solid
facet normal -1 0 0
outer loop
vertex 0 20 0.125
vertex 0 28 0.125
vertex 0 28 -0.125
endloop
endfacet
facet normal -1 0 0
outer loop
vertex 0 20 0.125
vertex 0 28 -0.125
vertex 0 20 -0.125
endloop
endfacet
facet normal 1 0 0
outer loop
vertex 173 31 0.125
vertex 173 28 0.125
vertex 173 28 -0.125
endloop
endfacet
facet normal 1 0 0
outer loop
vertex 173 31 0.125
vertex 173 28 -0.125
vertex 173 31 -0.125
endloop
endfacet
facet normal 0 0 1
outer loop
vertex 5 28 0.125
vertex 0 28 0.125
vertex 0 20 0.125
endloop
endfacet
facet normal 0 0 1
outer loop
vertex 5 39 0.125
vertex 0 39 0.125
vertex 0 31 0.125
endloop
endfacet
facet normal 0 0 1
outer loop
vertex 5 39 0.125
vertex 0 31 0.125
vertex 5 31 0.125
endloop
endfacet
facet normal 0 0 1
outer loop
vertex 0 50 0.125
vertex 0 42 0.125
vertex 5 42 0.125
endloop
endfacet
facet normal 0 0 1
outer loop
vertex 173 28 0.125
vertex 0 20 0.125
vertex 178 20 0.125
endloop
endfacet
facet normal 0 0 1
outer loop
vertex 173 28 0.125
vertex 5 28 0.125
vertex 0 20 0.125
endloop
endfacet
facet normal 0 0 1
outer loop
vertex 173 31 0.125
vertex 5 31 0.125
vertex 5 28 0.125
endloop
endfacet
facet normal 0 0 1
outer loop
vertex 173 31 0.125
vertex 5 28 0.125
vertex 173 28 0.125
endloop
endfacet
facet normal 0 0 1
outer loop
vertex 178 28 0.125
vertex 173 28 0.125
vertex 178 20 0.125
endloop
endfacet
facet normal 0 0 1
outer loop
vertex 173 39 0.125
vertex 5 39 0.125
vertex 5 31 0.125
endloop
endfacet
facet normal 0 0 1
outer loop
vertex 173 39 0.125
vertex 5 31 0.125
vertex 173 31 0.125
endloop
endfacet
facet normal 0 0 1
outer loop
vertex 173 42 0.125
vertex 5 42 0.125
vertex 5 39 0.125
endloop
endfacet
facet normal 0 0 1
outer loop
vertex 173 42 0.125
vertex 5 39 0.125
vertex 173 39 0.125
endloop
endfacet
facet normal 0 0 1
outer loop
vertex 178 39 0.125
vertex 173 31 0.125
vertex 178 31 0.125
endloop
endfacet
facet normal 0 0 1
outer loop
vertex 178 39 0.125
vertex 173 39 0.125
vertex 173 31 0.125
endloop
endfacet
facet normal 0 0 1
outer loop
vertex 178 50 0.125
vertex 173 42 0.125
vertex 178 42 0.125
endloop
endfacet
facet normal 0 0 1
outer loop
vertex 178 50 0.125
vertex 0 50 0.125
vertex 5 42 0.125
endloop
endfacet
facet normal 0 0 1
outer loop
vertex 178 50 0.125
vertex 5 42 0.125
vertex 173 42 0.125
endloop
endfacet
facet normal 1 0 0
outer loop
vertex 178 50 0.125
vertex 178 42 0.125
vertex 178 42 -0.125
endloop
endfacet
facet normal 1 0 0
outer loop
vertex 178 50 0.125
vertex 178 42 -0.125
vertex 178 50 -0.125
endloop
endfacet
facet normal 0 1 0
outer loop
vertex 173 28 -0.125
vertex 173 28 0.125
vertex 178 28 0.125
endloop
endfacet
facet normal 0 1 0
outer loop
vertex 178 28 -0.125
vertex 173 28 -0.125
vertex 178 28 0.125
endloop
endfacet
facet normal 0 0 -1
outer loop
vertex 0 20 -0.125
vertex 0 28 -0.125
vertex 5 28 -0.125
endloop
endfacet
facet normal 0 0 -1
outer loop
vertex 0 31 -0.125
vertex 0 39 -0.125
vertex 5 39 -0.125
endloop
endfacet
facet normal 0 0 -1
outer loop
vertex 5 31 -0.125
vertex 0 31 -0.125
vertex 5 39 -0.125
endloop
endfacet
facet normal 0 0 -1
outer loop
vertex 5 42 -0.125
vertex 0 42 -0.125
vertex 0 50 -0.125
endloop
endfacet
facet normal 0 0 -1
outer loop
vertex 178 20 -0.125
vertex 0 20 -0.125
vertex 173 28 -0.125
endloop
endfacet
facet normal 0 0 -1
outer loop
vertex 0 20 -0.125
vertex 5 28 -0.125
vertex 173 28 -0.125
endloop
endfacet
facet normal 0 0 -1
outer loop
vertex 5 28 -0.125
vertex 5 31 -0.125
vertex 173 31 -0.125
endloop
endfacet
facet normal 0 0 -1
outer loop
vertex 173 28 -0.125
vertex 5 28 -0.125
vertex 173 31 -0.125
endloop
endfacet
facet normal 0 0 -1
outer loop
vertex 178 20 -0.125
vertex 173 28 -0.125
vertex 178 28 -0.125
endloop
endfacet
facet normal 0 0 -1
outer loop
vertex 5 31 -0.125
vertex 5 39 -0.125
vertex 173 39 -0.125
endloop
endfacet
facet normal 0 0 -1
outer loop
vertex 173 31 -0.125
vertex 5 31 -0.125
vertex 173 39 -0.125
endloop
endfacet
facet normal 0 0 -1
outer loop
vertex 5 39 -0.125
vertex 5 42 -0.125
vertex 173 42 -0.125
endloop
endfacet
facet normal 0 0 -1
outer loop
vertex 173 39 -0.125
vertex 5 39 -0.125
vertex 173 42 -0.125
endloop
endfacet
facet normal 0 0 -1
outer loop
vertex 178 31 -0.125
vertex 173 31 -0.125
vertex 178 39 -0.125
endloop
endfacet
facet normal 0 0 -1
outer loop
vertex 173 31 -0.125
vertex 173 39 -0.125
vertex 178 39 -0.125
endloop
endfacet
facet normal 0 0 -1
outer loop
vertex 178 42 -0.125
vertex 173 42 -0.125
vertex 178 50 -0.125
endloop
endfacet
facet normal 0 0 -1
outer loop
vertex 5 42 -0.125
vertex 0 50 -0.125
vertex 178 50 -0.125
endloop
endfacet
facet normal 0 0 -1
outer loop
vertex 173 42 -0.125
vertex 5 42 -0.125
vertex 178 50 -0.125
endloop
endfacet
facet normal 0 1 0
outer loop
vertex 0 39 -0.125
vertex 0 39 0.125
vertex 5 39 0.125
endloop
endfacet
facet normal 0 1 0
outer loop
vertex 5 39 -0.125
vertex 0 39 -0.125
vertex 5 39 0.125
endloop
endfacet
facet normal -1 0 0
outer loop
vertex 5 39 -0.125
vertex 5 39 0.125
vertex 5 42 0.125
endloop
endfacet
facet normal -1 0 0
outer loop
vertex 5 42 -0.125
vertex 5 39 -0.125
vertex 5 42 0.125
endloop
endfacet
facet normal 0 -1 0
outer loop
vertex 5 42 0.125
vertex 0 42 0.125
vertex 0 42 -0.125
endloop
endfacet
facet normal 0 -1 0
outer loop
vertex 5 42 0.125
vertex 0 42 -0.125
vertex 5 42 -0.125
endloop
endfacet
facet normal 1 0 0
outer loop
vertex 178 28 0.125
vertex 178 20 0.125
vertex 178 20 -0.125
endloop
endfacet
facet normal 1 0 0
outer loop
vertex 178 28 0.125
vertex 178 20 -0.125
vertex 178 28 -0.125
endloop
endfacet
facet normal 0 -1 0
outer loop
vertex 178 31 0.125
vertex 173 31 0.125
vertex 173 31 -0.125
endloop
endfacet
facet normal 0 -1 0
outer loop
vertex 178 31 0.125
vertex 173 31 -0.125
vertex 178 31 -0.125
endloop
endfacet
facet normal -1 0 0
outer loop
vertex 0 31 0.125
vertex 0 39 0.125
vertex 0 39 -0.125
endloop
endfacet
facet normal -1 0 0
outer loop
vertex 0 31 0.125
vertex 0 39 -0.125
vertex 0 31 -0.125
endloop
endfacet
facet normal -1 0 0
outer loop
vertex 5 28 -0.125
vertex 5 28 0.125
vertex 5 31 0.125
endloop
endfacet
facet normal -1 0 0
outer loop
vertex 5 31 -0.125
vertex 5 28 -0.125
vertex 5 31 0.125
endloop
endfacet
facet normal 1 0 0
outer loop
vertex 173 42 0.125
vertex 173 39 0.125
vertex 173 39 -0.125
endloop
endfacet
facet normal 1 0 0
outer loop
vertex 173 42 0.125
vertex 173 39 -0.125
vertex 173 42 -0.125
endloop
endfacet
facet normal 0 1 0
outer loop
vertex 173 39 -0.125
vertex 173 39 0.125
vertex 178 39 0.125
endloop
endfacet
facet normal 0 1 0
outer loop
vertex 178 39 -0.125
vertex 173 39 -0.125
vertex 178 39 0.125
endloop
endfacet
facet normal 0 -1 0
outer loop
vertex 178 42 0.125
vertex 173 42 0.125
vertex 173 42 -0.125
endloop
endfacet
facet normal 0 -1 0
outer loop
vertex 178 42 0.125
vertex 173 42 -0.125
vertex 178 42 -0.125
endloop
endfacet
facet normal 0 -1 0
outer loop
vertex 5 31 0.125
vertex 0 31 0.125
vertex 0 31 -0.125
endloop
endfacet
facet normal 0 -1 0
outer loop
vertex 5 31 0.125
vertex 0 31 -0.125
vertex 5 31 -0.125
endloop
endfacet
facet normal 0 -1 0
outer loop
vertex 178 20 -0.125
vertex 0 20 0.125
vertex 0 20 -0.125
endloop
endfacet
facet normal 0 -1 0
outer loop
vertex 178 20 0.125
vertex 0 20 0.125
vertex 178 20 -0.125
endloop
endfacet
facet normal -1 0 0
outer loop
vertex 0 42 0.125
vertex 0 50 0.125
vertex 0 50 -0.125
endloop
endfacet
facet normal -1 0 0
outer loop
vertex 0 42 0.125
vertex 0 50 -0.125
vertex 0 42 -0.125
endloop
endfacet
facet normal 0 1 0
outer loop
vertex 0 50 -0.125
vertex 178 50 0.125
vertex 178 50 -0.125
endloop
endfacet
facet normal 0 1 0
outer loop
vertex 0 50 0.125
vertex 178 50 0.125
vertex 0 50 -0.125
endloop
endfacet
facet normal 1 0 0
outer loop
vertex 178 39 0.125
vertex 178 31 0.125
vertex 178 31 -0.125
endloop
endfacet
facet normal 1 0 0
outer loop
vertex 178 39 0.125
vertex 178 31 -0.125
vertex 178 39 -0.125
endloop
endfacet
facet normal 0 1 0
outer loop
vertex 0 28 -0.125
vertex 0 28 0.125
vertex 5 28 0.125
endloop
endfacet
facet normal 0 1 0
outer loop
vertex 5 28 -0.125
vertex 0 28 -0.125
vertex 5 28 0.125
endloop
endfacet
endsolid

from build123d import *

# Parameters (mm, degrees)
BOSS_EXTRUDE1_DEPTH  = 0.125
SKETCH4_W            = 5
SKETCH4_H            = 3
CUT_EXTRUDE2_DEPTH   = 185.889325003
LPATTERN3_COUNT      = 4
LPATTERN3_PITCH      = 11
LPATTERN3_COUNT_DIR2 = 2
LPATTERN3_PITCH_DIR2 = 173
SKETCH5_W            = 178
SKETCH5_H            = 20
CUT_EXTRUDE3_DEPTH   = 185.889325003


with BuildPart() as part:
    # Sketch2 → Boss-Extrude1 (new, symmetric)
    with BuildSketch(Plane.XY):
        Polygon((0, 0), (5, 0), (173, 20), (178, 20), (178, 50), (0, 50), align=None)
    extrude(amount=BOSS_EXTRUDE1_DEPTH, both=True)

    # Sketch4 → Cut-Extrude2 (cut, through all)
    with BuildSketch(Plane.XY.offset(0.125)):
        with Locations((175.5, 40.5)):
            Rectangle(SKETCH4_W, SKETCH4_H)
    cut_extrude2 = extrude(amount=-CUT_EXTRUDE2_DEPTH, mode=Mode.SUBTRACT)

    # LPattern3: Cut-Extrude2 4 × 2
    with Locations(*[(-j * LPATTERN3_PITCH_DIR2, -i * LPATTERN3_PITCH, 0) for i in range(LPATTERN3_COUNT) for j in range(LPATTERN3_COUNT_DIR2) if (i, j) != (0, 0)]):
        add(cut_extrude2, mode=Mode.SUBTRACT)

    # Sketch5 → Cut-Extrude3 (cut, through all)
    with BuildSketch(Plane.XY.offset(0.125)):
        with Locations((89, 10)):
            Rectangle(SKETCH5_W, SKETCH5_H)
    extrude(amount=-CUT_EXTRUDE3_DEPTH, mode=Mode.SUBTRACT)


solid = part.part
